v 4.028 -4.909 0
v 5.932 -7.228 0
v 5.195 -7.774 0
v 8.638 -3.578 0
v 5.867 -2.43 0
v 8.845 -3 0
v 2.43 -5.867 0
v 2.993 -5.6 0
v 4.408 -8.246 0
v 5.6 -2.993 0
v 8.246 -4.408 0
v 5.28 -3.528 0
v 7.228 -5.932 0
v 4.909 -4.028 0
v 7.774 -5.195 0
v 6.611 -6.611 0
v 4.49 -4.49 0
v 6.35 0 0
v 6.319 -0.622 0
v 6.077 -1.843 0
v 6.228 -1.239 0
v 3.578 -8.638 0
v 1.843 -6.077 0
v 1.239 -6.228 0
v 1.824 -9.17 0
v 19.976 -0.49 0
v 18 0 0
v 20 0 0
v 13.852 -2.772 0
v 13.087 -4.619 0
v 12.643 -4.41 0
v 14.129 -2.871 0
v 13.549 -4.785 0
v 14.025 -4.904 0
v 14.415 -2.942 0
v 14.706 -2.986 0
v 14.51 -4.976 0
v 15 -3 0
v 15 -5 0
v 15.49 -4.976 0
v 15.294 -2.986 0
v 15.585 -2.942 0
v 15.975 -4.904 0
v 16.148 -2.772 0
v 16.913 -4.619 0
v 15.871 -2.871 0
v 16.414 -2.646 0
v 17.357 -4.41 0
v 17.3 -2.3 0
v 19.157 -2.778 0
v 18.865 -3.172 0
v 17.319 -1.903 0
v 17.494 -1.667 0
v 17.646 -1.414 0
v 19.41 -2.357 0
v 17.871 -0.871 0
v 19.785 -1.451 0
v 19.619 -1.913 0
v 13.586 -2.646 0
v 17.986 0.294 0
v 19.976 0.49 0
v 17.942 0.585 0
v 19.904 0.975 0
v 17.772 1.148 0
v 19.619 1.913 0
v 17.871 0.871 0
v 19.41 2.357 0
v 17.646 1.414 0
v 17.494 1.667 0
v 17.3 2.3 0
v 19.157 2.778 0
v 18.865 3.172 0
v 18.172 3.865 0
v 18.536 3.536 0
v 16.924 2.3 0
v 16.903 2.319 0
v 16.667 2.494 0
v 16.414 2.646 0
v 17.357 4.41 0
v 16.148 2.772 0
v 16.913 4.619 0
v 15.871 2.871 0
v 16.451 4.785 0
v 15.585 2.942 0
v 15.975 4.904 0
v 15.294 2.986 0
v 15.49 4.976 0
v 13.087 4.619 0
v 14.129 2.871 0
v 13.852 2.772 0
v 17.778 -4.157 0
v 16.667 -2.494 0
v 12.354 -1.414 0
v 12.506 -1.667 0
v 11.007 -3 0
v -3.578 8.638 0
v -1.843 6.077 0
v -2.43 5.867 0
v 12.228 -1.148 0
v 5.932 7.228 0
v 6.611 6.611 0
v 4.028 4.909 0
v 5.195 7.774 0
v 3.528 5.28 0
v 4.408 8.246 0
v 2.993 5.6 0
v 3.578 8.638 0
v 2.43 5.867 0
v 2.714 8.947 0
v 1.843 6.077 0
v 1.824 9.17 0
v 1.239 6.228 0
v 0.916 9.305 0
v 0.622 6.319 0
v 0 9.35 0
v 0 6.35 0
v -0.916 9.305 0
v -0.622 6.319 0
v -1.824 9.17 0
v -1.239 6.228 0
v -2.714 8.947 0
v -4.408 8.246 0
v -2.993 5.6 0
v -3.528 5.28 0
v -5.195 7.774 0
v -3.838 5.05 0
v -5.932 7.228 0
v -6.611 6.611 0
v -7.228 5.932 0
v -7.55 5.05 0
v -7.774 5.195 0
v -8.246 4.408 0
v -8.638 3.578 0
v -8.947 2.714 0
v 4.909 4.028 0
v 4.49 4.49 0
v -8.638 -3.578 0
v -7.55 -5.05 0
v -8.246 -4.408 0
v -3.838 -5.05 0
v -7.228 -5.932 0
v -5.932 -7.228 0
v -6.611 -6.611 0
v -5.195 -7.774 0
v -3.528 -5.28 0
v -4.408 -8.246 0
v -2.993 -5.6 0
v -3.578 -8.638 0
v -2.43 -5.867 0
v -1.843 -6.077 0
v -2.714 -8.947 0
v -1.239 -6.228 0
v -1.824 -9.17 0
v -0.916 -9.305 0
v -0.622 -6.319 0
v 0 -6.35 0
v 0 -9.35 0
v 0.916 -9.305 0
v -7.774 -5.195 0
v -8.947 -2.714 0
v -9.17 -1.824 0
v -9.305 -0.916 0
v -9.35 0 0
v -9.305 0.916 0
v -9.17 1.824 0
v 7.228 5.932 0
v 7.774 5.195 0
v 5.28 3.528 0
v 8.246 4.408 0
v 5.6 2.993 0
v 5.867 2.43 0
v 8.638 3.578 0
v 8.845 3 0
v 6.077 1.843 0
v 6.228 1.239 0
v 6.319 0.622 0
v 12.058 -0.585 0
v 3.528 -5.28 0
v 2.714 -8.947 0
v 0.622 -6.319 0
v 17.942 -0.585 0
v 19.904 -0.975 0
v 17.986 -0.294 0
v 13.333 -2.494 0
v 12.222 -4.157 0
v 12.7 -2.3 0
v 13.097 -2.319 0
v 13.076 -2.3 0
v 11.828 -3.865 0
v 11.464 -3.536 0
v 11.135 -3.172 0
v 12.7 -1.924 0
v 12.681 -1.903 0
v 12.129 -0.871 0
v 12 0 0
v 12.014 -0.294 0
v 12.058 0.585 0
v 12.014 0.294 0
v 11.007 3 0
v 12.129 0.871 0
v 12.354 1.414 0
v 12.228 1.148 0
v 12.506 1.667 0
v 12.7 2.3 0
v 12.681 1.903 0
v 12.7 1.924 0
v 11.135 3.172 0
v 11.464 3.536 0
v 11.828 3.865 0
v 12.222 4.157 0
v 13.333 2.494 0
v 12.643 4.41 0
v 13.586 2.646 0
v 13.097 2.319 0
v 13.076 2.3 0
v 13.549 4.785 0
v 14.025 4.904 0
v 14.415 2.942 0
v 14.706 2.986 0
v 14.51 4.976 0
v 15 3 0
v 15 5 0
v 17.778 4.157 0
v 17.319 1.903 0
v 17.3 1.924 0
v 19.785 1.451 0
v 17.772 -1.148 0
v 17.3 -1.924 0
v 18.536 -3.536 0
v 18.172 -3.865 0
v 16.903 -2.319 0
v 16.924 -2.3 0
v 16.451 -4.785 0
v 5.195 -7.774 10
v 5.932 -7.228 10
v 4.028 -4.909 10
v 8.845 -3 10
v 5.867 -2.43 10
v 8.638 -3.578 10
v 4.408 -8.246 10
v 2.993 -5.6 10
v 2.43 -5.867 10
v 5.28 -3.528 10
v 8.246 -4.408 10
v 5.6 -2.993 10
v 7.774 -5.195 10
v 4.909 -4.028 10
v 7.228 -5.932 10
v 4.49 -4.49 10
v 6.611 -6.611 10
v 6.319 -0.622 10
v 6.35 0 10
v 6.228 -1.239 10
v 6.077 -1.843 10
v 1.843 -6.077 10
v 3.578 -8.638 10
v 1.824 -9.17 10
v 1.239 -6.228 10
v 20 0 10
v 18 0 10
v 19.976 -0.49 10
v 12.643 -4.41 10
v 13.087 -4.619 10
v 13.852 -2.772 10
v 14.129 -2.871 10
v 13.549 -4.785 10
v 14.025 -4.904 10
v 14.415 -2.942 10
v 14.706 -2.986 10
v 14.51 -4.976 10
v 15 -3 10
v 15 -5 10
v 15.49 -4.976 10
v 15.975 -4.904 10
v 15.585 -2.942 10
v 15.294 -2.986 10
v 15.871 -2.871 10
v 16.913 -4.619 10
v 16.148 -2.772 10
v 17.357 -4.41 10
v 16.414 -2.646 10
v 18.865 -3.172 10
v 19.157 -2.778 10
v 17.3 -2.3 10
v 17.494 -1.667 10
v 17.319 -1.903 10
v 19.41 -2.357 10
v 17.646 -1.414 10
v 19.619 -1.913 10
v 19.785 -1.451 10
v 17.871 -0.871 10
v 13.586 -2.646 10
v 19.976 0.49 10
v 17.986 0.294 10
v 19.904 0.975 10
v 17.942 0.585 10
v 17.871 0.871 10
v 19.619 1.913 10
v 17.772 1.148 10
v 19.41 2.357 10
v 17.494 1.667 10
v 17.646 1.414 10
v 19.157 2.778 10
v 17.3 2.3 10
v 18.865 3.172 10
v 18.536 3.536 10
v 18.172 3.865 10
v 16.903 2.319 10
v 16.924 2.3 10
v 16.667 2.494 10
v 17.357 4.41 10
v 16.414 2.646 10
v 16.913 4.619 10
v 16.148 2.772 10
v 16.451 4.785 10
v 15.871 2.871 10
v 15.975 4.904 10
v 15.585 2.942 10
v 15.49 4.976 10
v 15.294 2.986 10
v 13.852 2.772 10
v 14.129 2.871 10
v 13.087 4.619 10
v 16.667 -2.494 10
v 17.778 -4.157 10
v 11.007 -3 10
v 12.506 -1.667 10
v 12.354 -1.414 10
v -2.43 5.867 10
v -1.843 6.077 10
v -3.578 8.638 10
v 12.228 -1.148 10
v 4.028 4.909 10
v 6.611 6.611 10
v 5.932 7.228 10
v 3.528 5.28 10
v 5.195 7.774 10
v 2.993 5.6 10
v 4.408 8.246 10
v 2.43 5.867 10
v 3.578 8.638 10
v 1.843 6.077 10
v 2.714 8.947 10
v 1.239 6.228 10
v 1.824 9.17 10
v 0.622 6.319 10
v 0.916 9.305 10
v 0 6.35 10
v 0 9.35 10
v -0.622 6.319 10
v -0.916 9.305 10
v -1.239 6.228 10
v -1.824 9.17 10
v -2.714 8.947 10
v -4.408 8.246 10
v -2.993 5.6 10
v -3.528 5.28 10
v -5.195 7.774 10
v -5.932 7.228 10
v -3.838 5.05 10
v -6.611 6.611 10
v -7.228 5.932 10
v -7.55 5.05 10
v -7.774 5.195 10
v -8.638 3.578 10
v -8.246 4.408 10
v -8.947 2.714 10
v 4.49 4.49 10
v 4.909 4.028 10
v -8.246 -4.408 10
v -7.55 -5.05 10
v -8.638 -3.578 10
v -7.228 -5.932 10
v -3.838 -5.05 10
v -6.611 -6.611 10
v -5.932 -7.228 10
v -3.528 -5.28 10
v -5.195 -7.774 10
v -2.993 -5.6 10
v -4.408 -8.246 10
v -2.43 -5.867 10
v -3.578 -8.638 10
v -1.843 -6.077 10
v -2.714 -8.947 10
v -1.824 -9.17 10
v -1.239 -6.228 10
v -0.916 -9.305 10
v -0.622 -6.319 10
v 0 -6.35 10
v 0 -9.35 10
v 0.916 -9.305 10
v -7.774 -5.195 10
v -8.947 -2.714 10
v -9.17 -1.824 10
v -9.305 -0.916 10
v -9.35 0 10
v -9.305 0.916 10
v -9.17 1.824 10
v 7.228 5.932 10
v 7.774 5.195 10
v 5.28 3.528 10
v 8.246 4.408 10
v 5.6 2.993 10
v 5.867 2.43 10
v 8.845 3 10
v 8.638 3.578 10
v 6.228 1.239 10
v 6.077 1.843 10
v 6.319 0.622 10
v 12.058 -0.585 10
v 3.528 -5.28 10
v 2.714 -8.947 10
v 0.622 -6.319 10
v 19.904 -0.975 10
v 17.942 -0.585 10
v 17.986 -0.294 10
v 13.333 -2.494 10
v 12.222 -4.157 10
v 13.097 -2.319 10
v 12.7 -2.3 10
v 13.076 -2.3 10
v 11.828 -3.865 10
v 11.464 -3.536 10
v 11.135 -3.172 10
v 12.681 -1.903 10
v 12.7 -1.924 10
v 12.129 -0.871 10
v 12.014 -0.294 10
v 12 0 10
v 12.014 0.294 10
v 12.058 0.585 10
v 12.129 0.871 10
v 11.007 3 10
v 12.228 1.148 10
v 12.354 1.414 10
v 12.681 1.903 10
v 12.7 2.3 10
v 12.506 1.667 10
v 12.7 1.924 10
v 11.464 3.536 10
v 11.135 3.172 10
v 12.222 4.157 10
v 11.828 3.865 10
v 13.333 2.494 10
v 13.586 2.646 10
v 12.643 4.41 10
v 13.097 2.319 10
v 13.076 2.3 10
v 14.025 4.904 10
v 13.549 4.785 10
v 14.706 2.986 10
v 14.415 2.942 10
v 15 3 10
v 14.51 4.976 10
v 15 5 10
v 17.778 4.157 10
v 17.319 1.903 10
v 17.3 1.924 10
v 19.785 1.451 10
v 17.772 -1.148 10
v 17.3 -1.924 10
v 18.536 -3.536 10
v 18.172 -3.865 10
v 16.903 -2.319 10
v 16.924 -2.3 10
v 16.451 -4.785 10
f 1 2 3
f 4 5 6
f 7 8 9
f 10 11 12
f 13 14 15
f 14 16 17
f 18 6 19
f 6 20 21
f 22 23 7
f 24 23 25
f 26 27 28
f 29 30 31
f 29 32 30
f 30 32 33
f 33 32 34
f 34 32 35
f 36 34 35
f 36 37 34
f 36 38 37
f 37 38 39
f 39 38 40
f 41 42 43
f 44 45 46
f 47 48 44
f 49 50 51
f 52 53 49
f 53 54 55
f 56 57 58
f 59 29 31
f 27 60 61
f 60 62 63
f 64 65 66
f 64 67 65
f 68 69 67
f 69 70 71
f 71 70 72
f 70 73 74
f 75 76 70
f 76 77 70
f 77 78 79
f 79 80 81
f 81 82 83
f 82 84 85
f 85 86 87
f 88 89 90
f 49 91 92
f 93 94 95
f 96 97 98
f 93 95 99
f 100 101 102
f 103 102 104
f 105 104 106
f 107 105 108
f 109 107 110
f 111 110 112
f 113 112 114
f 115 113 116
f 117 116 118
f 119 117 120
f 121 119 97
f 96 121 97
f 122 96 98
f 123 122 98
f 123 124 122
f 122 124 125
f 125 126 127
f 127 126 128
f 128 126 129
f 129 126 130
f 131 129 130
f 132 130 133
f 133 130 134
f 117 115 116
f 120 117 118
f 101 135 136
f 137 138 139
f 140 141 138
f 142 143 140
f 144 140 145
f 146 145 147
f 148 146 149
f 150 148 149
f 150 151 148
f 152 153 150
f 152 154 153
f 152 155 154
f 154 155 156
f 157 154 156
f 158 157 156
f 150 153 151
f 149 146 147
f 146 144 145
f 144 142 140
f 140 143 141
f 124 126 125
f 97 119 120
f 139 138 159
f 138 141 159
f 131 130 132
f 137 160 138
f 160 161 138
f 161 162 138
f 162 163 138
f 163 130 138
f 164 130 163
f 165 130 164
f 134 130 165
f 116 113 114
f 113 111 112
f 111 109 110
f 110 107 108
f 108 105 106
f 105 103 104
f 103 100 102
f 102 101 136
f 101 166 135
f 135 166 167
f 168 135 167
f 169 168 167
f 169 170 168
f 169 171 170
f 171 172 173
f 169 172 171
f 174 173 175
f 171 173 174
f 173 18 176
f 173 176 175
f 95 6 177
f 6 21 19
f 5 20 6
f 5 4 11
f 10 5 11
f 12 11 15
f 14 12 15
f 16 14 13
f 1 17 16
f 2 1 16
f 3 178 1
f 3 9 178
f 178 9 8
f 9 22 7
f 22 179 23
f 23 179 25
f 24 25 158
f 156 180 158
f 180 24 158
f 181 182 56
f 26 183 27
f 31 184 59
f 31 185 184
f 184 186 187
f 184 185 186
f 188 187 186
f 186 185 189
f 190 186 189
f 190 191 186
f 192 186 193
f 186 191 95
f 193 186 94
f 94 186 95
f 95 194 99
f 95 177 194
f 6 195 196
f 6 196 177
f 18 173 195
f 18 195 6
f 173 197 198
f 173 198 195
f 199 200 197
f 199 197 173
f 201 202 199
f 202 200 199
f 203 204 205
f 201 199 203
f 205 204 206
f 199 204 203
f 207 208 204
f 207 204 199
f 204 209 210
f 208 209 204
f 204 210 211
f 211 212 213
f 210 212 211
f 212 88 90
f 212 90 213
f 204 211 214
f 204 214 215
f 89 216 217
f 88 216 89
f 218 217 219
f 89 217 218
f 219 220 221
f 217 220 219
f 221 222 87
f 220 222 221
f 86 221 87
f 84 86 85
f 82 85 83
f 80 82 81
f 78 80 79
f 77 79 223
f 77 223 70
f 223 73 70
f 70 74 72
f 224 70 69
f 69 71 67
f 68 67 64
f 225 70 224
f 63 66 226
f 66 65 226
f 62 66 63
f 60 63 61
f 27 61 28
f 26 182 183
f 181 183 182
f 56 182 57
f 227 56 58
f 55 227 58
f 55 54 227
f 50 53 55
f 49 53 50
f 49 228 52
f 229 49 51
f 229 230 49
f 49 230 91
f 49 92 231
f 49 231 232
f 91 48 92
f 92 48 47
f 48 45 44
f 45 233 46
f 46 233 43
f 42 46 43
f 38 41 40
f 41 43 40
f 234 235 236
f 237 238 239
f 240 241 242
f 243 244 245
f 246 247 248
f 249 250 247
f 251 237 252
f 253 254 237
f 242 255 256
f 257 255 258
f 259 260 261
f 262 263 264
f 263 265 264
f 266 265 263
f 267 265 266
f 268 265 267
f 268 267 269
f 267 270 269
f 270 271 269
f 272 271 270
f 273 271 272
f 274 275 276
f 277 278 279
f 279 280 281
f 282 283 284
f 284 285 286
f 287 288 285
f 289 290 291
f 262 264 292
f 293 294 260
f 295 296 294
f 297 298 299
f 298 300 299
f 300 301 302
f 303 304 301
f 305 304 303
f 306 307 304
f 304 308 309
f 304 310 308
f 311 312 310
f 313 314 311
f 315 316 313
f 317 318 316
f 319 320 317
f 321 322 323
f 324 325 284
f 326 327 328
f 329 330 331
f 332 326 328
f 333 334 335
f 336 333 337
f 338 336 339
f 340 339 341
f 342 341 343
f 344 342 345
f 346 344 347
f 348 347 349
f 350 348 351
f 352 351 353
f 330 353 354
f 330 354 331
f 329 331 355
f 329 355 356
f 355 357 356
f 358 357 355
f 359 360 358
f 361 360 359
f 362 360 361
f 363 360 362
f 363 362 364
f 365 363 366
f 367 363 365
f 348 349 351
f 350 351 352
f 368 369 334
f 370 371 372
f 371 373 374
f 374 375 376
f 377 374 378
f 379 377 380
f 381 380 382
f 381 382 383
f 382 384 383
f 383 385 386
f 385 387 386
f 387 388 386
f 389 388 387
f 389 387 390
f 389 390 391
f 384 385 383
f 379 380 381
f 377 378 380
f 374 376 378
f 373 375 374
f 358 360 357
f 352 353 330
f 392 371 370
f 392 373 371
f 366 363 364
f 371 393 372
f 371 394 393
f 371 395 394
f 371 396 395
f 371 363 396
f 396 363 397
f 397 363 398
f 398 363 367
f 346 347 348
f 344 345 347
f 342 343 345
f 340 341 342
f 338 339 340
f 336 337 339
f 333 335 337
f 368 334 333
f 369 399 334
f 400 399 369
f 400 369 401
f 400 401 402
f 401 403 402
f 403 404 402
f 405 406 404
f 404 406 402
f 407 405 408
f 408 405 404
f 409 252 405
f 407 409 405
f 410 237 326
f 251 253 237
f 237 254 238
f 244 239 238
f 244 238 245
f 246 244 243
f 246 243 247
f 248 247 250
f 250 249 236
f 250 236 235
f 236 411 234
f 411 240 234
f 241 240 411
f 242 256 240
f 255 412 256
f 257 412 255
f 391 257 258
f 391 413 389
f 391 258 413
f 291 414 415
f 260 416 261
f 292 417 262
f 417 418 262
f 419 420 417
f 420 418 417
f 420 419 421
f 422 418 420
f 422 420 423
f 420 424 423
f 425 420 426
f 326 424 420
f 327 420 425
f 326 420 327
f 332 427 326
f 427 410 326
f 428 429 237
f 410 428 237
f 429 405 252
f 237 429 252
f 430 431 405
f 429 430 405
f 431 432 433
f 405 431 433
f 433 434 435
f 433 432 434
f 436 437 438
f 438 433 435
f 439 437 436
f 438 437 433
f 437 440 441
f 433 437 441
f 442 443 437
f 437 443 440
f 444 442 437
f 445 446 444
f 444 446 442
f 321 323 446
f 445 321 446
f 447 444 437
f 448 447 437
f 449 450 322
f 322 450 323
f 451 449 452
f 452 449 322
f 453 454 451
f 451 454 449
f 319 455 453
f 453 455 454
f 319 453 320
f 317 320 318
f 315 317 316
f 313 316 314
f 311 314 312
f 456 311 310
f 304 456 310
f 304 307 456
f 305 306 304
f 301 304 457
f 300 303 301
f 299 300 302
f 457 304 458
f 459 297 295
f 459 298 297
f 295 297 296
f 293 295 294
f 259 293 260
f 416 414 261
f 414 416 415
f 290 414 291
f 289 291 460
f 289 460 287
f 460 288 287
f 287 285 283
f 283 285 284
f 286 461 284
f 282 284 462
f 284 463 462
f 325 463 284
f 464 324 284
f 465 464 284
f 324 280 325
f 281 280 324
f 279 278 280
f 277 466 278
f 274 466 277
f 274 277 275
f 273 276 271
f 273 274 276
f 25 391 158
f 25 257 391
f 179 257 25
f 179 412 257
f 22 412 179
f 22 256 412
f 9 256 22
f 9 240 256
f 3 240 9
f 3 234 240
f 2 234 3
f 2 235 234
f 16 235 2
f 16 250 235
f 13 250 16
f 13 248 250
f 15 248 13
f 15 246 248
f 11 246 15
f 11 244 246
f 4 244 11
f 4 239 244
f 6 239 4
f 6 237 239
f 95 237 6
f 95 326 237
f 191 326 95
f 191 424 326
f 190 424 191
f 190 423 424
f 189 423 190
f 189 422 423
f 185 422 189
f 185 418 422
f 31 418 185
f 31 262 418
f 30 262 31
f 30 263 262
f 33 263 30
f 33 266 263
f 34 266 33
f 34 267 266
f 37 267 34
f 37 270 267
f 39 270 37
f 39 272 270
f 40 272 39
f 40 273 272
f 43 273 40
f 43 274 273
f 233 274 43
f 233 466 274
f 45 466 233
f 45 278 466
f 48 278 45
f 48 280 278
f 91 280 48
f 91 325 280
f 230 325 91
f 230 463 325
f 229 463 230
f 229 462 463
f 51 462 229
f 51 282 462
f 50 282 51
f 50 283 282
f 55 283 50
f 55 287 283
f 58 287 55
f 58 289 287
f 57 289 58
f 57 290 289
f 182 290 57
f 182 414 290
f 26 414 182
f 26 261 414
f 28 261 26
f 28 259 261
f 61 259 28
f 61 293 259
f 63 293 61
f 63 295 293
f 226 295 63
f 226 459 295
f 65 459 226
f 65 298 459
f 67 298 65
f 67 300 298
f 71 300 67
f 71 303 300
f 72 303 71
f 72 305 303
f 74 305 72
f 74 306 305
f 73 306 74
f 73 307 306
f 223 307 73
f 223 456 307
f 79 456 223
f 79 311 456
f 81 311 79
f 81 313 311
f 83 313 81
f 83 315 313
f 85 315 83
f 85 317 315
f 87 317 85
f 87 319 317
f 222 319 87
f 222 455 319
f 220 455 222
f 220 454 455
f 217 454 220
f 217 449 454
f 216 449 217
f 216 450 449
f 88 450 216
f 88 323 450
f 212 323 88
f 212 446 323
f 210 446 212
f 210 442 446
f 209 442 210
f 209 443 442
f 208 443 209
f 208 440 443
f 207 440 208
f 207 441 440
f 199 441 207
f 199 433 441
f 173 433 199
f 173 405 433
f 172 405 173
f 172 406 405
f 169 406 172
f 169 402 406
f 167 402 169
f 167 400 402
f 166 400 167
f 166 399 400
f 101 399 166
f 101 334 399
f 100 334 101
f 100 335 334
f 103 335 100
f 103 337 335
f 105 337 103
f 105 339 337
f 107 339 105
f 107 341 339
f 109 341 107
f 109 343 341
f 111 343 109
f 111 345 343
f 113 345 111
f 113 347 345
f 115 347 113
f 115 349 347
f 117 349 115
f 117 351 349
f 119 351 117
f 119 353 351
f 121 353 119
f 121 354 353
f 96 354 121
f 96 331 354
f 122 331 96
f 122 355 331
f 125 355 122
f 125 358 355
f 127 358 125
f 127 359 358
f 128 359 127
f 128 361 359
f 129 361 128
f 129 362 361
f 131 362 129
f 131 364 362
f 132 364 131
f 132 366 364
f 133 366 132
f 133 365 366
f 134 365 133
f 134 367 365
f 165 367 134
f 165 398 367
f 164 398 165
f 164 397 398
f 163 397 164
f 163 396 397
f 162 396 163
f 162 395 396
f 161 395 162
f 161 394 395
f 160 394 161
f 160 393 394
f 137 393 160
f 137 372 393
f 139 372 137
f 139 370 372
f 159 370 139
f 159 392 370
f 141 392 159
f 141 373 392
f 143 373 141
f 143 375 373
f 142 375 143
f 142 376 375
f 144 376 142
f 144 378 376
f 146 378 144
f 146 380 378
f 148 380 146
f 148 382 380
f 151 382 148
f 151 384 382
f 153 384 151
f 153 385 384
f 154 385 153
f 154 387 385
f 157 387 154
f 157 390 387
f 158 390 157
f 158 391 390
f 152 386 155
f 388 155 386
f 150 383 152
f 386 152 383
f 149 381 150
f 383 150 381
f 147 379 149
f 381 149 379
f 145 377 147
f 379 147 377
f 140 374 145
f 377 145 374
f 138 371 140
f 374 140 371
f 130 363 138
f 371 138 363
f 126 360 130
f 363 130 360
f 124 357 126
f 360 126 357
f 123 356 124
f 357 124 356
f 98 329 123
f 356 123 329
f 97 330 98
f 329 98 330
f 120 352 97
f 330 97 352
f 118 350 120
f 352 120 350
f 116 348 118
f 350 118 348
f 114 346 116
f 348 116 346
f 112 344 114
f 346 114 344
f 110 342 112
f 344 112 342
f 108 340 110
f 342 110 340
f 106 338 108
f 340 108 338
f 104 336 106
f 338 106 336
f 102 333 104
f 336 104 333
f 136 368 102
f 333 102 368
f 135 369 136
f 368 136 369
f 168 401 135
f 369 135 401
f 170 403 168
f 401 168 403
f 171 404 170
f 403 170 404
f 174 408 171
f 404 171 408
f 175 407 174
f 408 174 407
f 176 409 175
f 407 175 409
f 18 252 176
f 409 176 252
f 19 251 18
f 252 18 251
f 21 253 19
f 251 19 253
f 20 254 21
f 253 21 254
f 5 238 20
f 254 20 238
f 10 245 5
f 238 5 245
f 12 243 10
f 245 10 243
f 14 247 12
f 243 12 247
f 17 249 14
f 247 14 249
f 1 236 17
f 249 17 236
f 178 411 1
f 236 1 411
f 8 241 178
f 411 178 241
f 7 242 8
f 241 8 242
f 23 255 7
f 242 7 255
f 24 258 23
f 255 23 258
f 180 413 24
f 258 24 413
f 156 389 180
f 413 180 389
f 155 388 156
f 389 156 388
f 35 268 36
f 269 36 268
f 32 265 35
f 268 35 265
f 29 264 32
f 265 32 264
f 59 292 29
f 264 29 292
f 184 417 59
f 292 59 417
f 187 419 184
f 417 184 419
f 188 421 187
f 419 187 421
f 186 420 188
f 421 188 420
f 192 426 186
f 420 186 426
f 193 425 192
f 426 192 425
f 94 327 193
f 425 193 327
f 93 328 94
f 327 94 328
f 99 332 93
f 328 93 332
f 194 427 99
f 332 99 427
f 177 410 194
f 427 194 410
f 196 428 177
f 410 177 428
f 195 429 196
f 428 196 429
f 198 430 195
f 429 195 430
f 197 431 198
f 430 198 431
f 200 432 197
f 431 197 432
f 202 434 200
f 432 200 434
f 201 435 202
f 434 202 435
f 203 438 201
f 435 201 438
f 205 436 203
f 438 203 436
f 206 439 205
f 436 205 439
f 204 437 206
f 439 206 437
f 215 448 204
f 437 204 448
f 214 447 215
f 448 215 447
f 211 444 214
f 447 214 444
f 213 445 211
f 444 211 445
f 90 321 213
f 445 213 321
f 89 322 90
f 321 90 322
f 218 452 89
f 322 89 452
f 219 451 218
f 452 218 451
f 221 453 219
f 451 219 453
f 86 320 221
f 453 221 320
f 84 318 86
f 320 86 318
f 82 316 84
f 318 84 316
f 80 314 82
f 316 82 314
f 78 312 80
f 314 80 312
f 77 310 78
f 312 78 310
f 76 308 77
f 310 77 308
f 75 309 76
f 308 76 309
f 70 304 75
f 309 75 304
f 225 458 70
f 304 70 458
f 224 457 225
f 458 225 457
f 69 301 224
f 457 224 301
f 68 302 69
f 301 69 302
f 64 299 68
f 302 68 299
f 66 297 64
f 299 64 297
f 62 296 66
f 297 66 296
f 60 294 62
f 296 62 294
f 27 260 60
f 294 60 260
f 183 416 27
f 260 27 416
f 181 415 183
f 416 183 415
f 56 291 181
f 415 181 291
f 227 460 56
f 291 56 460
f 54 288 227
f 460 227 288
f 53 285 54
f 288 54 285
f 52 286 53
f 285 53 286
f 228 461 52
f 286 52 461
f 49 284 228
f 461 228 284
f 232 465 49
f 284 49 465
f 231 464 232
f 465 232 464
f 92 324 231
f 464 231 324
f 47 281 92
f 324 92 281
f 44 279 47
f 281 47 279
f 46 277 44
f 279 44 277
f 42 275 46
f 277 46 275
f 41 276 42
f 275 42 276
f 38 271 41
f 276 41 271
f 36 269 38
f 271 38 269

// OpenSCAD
// --- Parameters (Dimensions in mm) ---

// Rod Ring (Inner diameter 12.7mm, Wall 3mm)
rod_inner_dia = 12.7;
rod_wall = 3.0;
rod_outer_dia = rod_inner_dia + (2 * rod_wall); // 18.7mm

// Rod Ring Cutout (10mm wide, 10mm tall, centered on -X side)
// Specification: "10 mm wide opening cut out of its -X side (everything with x < 0 and -5 < y < 5 is removed)"
// This implies the cutout is the region: x in [-5, 0] and y in [-5, 5].
rod_cutout_x_min = -5.0;
rod_cutout_x_max = 0.0;
rod_cutout_y_min = -5.0;
rod_cutout_y_max = 5.0;

// Tubing Ring (Inner diameter 6mm, Wall 2mm)
tube_inner_dia = 6.0;
tube_wall = 2.0;
tube_outer_dia = tube_inner_dia + (2 * tube_wall); // 10.0mm
tube_offset_x = 15.0;

// Tubing Ring Cutout (4.5mm wide, centered on +X side)
// Specification: "4.5 mm wide opening cut out of its +X side (x > 15 and -2.25 < y < 2.25)"
// This implies the cutout is the region: x in [15, 19.5] and y in [-2.25, 2.25].
tube_cutout_x_min = 15.0;
tube_cutout_x_max = 19.5;
tube_cutout_y_min = -2.25;
tube_cutout_y_max = 2.25;

// Bridge (6mm wide in Y, between x=8 and x=12)
bridge_x_start = 8.0;
bridge_x_end = 12.0;
bridge_y_width = 6.0;

// Extrusion Height
extrusion_z = 10.0;

// Resolution
$fn = 64;

// --- Modeling ---

module profile_2d() {
    difference() {
        union() {
            // 1. Rod Ring Profile
            difference() {
                circle(d = rod_outer_dia);
                circle(d = rod_inner_dia);
            }
            
            // 2. Tubing Ring Profile
            translate([tube_offset_x, 0])
            difference() {
                circle(d = tube_outer_dia);
                circle(d = tube_inner_dia);
            }
            
            // 3. Solid Bridge Profile
            // Spans from x=8 to x=12, centered on Y
            translate([(bridge_x_start + bridge_x_end)/2, 0])
                square([bridge_x_end - bridge_x_start, bridge_y_width], center = true);
        }

        // Subtract Rod Cutout: x < 0 and -5 < y < 5
        // We use a rectangle that covers the specified range and extends slightly to ensure clean cut.
        // The prompt specifies the region to be removed.
        translate([rod_cutout_x_min, 0])
            square([rod_cutout_x_max - rod_cutout_x_min + 0.1, rod_cutout_y_max - rod_cutout_y_min + 0.1], center = true);

        // Subtract Tubing Cutout: x > 15 and -2.25 < y < 2.25
        // The prompt specifies the region to be removed.
        translate([tube_cutout_x_min, 0])
            square([tube_cutout_x_max - tube_cutout_x_min + 0.1, tube_cutout_y_max - tube_cutout_y_min + 0.1], center = true);
    }
}

// Final 3D Object: Extrude the 2D profile
linear_extrude(height = extrusion_z) {
    profile_2d();
}
